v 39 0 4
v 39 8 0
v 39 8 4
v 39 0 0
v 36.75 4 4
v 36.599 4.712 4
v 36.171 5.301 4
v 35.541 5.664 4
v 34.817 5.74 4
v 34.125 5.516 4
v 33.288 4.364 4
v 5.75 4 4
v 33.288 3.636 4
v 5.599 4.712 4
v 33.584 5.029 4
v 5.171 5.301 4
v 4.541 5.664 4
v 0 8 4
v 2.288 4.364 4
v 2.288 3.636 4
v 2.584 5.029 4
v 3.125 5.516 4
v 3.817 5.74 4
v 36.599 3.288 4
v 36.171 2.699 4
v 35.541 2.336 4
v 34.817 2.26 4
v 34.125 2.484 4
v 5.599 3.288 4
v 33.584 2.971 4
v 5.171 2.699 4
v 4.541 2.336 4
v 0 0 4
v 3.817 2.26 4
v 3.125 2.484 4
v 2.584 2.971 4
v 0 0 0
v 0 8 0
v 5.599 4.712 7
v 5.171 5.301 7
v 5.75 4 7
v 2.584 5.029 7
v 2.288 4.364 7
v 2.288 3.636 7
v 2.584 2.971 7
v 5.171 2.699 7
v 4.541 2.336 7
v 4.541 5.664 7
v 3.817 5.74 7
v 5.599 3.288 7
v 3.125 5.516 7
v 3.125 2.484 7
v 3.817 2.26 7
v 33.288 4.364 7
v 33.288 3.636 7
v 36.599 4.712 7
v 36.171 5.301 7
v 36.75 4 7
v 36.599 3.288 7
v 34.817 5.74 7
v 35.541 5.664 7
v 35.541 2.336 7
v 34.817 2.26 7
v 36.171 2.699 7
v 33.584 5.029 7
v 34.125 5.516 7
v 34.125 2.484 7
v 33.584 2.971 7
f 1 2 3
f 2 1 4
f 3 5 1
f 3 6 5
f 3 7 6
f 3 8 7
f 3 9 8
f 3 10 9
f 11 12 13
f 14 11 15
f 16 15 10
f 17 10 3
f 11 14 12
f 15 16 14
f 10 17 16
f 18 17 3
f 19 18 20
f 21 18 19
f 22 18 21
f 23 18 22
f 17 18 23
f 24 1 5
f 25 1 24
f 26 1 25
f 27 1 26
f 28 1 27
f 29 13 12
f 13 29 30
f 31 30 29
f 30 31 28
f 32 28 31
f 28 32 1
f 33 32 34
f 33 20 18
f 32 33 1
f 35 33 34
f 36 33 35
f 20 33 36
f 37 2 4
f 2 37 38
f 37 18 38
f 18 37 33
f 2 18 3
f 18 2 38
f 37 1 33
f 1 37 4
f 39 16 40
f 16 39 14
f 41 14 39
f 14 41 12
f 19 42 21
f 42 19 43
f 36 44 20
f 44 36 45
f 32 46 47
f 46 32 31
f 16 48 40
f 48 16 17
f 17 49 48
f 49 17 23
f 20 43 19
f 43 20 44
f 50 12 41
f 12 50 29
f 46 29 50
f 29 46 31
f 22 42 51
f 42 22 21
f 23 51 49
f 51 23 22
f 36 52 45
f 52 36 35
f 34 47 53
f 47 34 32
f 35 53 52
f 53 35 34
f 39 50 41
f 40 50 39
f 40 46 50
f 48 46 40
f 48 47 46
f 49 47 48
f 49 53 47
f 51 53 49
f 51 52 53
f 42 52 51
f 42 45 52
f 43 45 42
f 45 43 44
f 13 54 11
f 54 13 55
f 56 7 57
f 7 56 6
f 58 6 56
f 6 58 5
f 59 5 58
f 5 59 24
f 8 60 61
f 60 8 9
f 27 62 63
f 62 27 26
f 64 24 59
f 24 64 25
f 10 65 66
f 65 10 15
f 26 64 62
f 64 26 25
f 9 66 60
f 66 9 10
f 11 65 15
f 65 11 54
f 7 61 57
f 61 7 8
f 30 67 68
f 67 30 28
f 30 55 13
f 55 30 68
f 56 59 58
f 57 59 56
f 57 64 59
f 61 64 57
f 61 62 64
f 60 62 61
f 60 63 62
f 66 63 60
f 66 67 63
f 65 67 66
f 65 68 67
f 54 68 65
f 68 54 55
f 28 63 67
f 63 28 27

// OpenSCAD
height = 4;

cube(size=[39, 8, height]);
translate([4, 4, height]) cylinder(h=3, d=3.5, $fn = 15);
translate([35, 4, height]) cylinder(h=3, d=3.5, $fn = 15);
